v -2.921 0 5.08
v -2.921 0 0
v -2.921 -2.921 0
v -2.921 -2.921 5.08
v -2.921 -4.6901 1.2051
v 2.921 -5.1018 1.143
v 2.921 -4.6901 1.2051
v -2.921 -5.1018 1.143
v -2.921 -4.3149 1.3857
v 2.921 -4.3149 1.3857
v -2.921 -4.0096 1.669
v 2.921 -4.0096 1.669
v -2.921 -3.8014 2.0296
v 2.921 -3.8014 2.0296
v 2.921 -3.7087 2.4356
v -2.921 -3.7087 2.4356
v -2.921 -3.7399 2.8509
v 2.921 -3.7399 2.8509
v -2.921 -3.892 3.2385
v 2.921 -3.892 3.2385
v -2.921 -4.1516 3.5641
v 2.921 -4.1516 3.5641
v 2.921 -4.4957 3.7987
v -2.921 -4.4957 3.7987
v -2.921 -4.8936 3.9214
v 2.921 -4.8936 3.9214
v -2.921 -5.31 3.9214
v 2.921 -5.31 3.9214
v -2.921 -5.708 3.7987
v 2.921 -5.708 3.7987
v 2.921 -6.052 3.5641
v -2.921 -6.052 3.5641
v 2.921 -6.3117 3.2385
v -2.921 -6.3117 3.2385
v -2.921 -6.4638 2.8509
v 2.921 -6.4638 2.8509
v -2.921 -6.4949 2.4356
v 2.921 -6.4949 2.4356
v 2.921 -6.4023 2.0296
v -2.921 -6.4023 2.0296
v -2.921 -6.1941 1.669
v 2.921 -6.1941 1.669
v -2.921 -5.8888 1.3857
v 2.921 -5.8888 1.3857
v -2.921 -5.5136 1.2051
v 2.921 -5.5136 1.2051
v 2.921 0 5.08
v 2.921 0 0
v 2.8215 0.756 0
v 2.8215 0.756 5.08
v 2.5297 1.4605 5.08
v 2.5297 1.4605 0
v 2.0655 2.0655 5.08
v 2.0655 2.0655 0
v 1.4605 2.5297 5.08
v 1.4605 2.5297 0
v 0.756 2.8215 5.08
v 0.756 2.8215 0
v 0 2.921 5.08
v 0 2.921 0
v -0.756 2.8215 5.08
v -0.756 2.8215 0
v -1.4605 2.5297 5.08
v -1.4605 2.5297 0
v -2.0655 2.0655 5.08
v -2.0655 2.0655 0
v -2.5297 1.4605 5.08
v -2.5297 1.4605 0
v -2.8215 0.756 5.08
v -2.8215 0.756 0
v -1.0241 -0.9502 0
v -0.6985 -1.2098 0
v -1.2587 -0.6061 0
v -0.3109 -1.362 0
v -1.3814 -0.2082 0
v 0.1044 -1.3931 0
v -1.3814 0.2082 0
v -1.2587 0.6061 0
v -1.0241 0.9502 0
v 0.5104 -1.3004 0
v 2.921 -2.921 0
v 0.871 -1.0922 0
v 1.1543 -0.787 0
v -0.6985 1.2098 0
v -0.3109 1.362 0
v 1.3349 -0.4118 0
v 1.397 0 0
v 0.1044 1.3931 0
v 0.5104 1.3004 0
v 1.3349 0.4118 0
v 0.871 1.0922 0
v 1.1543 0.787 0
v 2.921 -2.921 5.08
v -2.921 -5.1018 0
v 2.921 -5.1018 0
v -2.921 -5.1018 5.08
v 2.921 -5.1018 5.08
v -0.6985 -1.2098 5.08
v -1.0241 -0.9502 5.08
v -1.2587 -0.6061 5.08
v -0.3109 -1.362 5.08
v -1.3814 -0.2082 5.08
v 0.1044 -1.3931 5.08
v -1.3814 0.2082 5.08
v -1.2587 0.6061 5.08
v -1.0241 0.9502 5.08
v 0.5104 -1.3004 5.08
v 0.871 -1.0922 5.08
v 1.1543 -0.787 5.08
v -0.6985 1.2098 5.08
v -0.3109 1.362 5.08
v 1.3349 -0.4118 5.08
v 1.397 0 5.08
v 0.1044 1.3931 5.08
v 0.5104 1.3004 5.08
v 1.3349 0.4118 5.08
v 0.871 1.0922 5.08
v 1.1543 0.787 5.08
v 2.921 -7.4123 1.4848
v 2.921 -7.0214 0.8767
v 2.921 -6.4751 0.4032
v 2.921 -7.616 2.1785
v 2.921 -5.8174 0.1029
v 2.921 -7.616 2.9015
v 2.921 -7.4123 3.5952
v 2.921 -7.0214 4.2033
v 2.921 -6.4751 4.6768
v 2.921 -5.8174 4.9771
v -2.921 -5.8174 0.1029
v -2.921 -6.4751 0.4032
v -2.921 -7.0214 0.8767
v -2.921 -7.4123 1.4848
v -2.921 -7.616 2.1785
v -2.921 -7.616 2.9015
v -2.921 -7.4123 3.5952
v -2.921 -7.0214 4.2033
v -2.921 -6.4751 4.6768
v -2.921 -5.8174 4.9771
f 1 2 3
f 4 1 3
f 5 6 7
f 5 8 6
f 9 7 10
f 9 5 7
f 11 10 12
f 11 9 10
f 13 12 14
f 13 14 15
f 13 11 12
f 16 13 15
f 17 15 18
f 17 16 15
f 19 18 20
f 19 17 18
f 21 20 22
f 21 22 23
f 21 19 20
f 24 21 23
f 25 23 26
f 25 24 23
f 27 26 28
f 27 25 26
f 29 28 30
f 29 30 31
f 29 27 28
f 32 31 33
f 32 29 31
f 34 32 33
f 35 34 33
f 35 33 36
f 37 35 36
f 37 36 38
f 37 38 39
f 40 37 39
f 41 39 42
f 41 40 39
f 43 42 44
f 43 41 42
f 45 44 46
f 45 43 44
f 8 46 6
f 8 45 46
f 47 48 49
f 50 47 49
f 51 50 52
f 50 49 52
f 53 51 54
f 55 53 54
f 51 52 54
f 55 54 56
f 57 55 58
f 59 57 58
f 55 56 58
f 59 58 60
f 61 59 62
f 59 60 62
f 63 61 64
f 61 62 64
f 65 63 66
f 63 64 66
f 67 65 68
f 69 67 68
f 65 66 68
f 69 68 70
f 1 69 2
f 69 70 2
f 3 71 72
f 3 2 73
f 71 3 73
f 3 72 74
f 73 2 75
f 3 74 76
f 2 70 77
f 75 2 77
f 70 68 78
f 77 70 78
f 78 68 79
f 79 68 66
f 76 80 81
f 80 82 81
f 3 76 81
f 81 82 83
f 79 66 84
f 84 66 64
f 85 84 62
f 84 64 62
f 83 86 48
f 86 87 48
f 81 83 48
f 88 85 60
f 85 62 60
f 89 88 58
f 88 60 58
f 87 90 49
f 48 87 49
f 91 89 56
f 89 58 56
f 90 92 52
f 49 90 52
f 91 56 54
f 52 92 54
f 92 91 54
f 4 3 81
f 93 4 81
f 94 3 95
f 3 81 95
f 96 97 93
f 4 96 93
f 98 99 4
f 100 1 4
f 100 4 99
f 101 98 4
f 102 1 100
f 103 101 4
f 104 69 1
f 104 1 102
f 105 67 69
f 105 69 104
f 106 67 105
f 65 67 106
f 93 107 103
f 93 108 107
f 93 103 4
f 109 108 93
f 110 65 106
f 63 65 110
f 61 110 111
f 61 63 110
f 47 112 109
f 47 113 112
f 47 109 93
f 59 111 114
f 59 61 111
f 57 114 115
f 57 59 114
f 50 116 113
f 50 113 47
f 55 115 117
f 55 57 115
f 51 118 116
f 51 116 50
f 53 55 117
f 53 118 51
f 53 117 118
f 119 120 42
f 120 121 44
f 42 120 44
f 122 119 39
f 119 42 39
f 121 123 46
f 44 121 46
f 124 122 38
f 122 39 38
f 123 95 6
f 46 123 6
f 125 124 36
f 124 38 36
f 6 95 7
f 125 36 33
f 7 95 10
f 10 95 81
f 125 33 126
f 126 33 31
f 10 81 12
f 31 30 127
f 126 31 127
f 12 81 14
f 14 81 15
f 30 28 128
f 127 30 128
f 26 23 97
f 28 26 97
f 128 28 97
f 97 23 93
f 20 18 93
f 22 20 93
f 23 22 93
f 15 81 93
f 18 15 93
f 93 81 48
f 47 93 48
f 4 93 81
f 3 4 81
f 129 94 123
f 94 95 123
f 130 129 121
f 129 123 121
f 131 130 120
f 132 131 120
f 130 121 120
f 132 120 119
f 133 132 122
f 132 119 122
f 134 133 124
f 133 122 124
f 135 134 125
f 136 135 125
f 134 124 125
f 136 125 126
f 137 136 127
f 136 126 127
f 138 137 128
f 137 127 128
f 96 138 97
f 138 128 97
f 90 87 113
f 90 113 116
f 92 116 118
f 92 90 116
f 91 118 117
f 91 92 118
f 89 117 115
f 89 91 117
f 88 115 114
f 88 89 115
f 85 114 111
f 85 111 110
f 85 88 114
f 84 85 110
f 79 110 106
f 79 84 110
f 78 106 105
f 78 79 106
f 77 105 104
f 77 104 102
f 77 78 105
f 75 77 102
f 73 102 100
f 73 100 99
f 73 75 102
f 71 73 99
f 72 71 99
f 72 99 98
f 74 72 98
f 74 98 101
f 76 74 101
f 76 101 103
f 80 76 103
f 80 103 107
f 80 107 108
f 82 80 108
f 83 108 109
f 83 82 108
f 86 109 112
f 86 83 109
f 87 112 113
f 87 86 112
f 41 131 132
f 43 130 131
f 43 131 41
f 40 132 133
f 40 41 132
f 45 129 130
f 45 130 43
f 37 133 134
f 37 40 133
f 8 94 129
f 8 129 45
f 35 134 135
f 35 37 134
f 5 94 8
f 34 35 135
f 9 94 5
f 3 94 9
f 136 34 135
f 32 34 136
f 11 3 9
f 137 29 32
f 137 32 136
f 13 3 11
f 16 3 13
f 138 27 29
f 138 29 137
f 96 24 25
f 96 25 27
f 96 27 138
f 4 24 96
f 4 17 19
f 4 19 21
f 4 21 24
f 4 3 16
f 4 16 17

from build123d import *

# Parameters (mm, degrees)
SKETCH1_R           = 1.397
BOSS_EXTRUDE1_DEPTH = 5.08
SKETCH2_R           = 1.397
BOSS_EXTRUDE2_DEPTH = 2.921


with BuildPart() as part:
    # Sketch1 → Boss-Extrude1 (new body)
    with BuildSketch(Plane.XY):
        with BuildLine():
            Line((-2.921, 0), (-2.921, -2.921))
            Line((-2.921, -2.921), (2.921, -2.921))
            Line((2.921, -2.921), (2.921, 0))
            ThreePointArc((2.921, 0), (0, 2.921), (-2.921, 0))
        make_face()
        Circle(SKETCH1_R, mode=Mode.SUBTRACT)
    extrude(amount=BOSS_EXTRUDE1_DEPTH)


with BuildPart() as body_2:
    # Sketch2 → Boss-Extrude2 (new body, symmetric)
    with BuildSketch(Plane(origin=(0, 0, 0), x_dir=(0, 0, -1), z_dir=(1, 0, 0))):
        with BuildLine():
            Line((-5.08, -2.921), (0, -2.921))
            Line((0, -2.921), (0, -5.101837624))
            ThreePointArc((0, -5.101837624), (-2.54, -7.641837624), (-5.08, -5.101837624))
            Line((-5.08, -5.101837624), (-5.08, -2.921))
        make_face()
        with Locations((-2.54, -5.101837624)):
            Circle(SKETCH2_R, mode=Mode.SUBTRACT)
    extrude(amount=BOSS_EXTRUDE2_DEPTH, both=True)


solid = Compound([part.part, body_2.part])
